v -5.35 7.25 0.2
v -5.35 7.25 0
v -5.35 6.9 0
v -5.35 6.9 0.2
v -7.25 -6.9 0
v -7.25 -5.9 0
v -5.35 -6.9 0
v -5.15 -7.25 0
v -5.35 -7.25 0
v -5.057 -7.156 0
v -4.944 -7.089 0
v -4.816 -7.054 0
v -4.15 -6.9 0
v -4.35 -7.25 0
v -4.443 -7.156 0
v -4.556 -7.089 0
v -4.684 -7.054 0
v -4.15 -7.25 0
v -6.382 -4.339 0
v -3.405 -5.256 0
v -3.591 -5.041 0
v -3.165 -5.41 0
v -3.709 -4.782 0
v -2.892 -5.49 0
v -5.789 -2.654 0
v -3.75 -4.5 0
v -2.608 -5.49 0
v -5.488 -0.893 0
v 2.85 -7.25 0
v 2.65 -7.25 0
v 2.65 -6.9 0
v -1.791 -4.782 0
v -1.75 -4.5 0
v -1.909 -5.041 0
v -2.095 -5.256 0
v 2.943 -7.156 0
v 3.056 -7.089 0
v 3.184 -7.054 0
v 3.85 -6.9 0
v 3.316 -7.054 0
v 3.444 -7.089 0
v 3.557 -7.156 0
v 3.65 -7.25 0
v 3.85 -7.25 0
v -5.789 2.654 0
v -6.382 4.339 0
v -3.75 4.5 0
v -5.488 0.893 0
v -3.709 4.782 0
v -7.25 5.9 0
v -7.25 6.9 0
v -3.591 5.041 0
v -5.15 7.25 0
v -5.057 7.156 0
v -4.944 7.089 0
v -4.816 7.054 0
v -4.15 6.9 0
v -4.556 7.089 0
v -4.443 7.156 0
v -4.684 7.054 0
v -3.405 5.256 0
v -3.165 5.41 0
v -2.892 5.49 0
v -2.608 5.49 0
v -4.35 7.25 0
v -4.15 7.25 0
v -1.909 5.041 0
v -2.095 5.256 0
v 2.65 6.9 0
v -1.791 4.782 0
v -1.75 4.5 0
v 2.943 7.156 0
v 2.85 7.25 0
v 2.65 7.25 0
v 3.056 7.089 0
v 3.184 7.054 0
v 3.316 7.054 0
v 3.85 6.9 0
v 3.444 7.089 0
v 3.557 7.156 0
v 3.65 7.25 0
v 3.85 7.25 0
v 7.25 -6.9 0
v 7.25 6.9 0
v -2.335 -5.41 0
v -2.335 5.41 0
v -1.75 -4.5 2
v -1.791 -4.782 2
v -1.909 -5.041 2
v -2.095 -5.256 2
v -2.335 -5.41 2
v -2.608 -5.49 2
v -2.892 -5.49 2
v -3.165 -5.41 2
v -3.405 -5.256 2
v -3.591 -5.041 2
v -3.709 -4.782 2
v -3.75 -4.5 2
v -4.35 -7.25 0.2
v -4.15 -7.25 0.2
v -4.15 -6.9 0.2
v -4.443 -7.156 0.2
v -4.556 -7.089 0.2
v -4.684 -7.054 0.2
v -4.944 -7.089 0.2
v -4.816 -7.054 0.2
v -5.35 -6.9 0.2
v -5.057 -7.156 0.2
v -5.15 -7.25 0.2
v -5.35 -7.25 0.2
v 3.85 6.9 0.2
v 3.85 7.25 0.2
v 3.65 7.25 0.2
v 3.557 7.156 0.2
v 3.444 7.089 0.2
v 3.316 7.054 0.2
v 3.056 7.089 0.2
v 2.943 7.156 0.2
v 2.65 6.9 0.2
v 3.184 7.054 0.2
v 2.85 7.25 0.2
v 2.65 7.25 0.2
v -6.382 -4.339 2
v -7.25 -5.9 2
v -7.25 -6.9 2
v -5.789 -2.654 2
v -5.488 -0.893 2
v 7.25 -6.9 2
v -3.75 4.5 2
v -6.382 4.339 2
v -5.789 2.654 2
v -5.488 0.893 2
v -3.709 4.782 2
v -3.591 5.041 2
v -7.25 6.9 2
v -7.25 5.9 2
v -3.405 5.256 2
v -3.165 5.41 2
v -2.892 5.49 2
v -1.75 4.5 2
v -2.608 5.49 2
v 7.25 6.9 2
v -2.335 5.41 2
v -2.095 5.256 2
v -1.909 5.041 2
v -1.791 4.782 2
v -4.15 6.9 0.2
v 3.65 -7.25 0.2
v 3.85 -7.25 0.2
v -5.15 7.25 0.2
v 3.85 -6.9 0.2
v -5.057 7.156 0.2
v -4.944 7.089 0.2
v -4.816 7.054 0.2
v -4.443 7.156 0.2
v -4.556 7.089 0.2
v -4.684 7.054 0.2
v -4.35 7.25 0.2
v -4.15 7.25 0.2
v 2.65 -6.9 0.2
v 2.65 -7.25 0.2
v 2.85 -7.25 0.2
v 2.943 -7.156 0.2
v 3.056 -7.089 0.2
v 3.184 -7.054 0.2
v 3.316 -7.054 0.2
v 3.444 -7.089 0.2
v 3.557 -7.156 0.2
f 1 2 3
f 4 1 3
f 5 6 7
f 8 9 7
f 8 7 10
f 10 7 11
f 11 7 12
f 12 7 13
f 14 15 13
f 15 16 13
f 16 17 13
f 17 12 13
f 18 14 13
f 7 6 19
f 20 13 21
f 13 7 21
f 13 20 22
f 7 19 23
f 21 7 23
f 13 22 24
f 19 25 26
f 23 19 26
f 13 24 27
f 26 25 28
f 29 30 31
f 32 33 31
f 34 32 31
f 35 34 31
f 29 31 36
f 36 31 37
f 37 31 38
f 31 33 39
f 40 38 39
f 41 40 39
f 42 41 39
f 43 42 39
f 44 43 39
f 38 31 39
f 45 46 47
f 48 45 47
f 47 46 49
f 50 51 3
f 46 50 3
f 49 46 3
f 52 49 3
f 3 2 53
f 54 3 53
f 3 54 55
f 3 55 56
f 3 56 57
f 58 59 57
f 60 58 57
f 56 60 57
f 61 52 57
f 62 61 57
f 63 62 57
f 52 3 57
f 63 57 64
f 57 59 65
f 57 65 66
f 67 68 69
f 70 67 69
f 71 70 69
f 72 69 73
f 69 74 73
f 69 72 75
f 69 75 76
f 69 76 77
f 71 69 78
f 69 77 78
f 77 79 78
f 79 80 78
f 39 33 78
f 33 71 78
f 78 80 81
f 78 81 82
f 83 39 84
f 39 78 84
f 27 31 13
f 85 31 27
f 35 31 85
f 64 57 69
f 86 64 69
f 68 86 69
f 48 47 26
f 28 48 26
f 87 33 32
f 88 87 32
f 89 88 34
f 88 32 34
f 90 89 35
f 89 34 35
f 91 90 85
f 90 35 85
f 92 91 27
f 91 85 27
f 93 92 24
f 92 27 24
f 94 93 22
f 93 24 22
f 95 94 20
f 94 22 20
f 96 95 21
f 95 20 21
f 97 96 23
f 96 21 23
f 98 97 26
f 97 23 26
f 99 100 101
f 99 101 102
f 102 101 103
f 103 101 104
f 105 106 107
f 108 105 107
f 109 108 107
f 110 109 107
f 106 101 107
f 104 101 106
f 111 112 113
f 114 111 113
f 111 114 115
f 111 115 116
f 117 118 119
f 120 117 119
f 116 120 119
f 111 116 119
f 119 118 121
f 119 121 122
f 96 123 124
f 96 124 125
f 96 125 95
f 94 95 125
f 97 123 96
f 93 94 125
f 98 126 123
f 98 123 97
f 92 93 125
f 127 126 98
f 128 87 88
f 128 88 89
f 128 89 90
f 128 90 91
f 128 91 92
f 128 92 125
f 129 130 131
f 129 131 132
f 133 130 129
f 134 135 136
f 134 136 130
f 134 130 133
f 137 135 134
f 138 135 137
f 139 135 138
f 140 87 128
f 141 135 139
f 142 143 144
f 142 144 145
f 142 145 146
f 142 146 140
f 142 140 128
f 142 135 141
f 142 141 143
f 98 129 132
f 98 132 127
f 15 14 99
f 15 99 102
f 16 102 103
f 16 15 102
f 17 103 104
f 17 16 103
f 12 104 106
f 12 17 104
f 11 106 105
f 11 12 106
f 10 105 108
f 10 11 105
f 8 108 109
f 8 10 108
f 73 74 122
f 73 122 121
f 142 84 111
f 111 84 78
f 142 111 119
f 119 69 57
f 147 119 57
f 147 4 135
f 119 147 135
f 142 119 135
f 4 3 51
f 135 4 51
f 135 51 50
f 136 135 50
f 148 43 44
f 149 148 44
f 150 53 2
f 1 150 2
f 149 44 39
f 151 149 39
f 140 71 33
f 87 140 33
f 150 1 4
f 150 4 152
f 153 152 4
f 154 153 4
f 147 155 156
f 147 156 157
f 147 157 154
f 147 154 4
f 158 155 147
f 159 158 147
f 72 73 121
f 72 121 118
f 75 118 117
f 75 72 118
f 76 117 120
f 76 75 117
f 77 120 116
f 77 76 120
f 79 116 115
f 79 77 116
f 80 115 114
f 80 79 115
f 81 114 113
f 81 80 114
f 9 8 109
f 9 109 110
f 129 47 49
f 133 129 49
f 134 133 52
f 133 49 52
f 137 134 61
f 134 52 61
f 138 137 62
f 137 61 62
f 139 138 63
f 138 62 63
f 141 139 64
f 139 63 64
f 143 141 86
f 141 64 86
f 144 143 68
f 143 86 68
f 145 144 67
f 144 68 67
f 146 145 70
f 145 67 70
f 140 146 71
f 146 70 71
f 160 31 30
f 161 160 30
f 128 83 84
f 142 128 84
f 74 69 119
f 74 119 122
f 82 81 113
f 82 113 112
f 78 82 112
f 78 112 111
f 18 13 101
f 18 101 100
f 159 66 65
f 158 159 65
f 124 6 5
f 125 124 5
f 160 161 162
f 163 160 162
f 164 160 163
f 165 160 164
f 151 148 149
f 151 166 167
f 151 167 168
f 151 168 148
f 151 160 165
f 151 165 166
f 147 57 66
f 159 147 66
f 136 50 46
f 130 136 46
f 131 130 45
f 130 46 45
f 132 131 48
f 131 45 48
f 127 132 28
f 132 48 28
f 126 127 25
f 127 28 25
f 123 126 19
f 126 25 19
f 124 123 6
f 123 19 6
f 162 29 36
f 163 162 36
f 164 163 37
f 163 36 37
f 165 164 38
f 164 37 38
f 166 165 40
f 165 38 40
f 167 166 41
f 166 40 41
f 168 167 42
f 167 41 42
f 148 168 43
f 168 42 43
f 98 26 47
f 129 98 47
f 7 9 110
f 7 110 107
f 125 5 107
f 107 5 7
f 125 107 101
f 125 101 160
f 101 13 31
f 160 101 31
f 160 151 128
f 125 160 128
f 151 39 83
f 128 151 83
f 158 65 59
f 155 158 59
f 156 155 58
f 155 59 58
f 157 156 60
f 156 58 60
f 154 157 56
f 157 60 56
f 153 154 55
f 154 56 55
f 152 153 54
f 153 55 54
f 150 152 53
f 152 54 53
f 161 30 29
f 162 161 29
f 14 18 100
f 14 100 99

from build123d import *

# Parameters (mm, degrees)
BOSS_EXTRUDE1_DEPTH = 2
BOSS_EXTRUDE2_DEPTH = 0.2


with BuildPart() as part:
    # Sketch1 → Boss-Extrude1 (new body)
    with BuildSketch(Plane.XY):
        with BuildLine():
            Line((-7.25, 6.9), (-7.25, 5.9))
            ThreePointArc((-7.25, 5.9), (-5.45, 0), (-7.25, -5.9))
            Line((-7.25, -5.9), (-7.25, -6.9))
            Line((-7.25, -6.9), (7.25, -6.9))
            Line((7.25, -6.9), (7.25, 6.9))
            Line((7.25, 6.9), (-7.25, 6.9))
        make_face()
        with BuildLine():
            Line((-3.75, -4.5), (-3.75, 4.5))
            ThreePointArc((-3.75, 4.5), (-2.75, 5.5), (-1.75, 4.5))
            Line((-1.75, 4.5), (-1.75, -4.5))
            ThreePointArc((-1.75, -4.5), (-2.75, -5.5), (-3.75, -4.5))
        make_face(mode=Mode.SUBTRACT)
    extrude(amount=BOSS_EXTRUDE1_DEPTH)

    # Sketch2 → Boss-Extrude2 (add)
    with BuildSketch(Plane.XY):
        with BuildLine():
            Line((-5.15, 7.25), (-5.35, 7.25))
            Line((-5.35, 7.25), (-5.35, 6.9))
            Line((-5.35, 6.9), (-4.15, 6.9))
            Line((-4.15, 6.9), (-4.15, 7.25))
            Line((-4.15, 7.25), (-4.35, 7.25))
            ThreePointArc((-4.35, 7.25), (-4.75, 7.05), (-5.15, 7.25))
        make_face()
        with BuildLine():
            Line((2.65, 7.25), (2.85, 7.25))
            ThreePointArc((2.85, 7.25), (3.25, 7.05), (3.65, 7.25))
            Line((3.65, 7.25), (3.85, 7.25))
            Line((3.85, 7.25), (3.85, 6.9))
            Line((3.85, 6.9), (2.65, 6.9))
            Line((2.65, 6.9), (2.65, 7.25))
        make_face()
        with BuildLine():
            Line((3.65, -7.25), (3.85, -7.25))
            Line((3.85, -7.25), (3.85, -6.9))
            Line((3.85, -6.9), (2.65, -6.9))
            Line((2.65, -6.9), (2.65, -7.25))
            Line((2.65, -7.25), (2.85, -7.25))
            ThreePointArc((2.85, -7.25), (3.25, -7.05), (3.65, -7.25))
        make_face()
        with BuildLine():
            Line((-4.15, -7.25), (-4.35, -7.25))
            ThreePointArc((-4.35, -7.25), (-4.75, -7.05), (-5.15, -7.25))
            Line((-5.15, -7.25), (-5.35, -7.25))
            Line((-5.35, -7.25), (-5.35, -6.9))
            Line((-5.35, -6.9), (-4.15, -6.9))
            Line((-4.15, -6.9), (-4.15, -7.25))
        make_face()
    extrude(amount=BOSS_EXTRUDE2_DEPTH)


solid = part.part
